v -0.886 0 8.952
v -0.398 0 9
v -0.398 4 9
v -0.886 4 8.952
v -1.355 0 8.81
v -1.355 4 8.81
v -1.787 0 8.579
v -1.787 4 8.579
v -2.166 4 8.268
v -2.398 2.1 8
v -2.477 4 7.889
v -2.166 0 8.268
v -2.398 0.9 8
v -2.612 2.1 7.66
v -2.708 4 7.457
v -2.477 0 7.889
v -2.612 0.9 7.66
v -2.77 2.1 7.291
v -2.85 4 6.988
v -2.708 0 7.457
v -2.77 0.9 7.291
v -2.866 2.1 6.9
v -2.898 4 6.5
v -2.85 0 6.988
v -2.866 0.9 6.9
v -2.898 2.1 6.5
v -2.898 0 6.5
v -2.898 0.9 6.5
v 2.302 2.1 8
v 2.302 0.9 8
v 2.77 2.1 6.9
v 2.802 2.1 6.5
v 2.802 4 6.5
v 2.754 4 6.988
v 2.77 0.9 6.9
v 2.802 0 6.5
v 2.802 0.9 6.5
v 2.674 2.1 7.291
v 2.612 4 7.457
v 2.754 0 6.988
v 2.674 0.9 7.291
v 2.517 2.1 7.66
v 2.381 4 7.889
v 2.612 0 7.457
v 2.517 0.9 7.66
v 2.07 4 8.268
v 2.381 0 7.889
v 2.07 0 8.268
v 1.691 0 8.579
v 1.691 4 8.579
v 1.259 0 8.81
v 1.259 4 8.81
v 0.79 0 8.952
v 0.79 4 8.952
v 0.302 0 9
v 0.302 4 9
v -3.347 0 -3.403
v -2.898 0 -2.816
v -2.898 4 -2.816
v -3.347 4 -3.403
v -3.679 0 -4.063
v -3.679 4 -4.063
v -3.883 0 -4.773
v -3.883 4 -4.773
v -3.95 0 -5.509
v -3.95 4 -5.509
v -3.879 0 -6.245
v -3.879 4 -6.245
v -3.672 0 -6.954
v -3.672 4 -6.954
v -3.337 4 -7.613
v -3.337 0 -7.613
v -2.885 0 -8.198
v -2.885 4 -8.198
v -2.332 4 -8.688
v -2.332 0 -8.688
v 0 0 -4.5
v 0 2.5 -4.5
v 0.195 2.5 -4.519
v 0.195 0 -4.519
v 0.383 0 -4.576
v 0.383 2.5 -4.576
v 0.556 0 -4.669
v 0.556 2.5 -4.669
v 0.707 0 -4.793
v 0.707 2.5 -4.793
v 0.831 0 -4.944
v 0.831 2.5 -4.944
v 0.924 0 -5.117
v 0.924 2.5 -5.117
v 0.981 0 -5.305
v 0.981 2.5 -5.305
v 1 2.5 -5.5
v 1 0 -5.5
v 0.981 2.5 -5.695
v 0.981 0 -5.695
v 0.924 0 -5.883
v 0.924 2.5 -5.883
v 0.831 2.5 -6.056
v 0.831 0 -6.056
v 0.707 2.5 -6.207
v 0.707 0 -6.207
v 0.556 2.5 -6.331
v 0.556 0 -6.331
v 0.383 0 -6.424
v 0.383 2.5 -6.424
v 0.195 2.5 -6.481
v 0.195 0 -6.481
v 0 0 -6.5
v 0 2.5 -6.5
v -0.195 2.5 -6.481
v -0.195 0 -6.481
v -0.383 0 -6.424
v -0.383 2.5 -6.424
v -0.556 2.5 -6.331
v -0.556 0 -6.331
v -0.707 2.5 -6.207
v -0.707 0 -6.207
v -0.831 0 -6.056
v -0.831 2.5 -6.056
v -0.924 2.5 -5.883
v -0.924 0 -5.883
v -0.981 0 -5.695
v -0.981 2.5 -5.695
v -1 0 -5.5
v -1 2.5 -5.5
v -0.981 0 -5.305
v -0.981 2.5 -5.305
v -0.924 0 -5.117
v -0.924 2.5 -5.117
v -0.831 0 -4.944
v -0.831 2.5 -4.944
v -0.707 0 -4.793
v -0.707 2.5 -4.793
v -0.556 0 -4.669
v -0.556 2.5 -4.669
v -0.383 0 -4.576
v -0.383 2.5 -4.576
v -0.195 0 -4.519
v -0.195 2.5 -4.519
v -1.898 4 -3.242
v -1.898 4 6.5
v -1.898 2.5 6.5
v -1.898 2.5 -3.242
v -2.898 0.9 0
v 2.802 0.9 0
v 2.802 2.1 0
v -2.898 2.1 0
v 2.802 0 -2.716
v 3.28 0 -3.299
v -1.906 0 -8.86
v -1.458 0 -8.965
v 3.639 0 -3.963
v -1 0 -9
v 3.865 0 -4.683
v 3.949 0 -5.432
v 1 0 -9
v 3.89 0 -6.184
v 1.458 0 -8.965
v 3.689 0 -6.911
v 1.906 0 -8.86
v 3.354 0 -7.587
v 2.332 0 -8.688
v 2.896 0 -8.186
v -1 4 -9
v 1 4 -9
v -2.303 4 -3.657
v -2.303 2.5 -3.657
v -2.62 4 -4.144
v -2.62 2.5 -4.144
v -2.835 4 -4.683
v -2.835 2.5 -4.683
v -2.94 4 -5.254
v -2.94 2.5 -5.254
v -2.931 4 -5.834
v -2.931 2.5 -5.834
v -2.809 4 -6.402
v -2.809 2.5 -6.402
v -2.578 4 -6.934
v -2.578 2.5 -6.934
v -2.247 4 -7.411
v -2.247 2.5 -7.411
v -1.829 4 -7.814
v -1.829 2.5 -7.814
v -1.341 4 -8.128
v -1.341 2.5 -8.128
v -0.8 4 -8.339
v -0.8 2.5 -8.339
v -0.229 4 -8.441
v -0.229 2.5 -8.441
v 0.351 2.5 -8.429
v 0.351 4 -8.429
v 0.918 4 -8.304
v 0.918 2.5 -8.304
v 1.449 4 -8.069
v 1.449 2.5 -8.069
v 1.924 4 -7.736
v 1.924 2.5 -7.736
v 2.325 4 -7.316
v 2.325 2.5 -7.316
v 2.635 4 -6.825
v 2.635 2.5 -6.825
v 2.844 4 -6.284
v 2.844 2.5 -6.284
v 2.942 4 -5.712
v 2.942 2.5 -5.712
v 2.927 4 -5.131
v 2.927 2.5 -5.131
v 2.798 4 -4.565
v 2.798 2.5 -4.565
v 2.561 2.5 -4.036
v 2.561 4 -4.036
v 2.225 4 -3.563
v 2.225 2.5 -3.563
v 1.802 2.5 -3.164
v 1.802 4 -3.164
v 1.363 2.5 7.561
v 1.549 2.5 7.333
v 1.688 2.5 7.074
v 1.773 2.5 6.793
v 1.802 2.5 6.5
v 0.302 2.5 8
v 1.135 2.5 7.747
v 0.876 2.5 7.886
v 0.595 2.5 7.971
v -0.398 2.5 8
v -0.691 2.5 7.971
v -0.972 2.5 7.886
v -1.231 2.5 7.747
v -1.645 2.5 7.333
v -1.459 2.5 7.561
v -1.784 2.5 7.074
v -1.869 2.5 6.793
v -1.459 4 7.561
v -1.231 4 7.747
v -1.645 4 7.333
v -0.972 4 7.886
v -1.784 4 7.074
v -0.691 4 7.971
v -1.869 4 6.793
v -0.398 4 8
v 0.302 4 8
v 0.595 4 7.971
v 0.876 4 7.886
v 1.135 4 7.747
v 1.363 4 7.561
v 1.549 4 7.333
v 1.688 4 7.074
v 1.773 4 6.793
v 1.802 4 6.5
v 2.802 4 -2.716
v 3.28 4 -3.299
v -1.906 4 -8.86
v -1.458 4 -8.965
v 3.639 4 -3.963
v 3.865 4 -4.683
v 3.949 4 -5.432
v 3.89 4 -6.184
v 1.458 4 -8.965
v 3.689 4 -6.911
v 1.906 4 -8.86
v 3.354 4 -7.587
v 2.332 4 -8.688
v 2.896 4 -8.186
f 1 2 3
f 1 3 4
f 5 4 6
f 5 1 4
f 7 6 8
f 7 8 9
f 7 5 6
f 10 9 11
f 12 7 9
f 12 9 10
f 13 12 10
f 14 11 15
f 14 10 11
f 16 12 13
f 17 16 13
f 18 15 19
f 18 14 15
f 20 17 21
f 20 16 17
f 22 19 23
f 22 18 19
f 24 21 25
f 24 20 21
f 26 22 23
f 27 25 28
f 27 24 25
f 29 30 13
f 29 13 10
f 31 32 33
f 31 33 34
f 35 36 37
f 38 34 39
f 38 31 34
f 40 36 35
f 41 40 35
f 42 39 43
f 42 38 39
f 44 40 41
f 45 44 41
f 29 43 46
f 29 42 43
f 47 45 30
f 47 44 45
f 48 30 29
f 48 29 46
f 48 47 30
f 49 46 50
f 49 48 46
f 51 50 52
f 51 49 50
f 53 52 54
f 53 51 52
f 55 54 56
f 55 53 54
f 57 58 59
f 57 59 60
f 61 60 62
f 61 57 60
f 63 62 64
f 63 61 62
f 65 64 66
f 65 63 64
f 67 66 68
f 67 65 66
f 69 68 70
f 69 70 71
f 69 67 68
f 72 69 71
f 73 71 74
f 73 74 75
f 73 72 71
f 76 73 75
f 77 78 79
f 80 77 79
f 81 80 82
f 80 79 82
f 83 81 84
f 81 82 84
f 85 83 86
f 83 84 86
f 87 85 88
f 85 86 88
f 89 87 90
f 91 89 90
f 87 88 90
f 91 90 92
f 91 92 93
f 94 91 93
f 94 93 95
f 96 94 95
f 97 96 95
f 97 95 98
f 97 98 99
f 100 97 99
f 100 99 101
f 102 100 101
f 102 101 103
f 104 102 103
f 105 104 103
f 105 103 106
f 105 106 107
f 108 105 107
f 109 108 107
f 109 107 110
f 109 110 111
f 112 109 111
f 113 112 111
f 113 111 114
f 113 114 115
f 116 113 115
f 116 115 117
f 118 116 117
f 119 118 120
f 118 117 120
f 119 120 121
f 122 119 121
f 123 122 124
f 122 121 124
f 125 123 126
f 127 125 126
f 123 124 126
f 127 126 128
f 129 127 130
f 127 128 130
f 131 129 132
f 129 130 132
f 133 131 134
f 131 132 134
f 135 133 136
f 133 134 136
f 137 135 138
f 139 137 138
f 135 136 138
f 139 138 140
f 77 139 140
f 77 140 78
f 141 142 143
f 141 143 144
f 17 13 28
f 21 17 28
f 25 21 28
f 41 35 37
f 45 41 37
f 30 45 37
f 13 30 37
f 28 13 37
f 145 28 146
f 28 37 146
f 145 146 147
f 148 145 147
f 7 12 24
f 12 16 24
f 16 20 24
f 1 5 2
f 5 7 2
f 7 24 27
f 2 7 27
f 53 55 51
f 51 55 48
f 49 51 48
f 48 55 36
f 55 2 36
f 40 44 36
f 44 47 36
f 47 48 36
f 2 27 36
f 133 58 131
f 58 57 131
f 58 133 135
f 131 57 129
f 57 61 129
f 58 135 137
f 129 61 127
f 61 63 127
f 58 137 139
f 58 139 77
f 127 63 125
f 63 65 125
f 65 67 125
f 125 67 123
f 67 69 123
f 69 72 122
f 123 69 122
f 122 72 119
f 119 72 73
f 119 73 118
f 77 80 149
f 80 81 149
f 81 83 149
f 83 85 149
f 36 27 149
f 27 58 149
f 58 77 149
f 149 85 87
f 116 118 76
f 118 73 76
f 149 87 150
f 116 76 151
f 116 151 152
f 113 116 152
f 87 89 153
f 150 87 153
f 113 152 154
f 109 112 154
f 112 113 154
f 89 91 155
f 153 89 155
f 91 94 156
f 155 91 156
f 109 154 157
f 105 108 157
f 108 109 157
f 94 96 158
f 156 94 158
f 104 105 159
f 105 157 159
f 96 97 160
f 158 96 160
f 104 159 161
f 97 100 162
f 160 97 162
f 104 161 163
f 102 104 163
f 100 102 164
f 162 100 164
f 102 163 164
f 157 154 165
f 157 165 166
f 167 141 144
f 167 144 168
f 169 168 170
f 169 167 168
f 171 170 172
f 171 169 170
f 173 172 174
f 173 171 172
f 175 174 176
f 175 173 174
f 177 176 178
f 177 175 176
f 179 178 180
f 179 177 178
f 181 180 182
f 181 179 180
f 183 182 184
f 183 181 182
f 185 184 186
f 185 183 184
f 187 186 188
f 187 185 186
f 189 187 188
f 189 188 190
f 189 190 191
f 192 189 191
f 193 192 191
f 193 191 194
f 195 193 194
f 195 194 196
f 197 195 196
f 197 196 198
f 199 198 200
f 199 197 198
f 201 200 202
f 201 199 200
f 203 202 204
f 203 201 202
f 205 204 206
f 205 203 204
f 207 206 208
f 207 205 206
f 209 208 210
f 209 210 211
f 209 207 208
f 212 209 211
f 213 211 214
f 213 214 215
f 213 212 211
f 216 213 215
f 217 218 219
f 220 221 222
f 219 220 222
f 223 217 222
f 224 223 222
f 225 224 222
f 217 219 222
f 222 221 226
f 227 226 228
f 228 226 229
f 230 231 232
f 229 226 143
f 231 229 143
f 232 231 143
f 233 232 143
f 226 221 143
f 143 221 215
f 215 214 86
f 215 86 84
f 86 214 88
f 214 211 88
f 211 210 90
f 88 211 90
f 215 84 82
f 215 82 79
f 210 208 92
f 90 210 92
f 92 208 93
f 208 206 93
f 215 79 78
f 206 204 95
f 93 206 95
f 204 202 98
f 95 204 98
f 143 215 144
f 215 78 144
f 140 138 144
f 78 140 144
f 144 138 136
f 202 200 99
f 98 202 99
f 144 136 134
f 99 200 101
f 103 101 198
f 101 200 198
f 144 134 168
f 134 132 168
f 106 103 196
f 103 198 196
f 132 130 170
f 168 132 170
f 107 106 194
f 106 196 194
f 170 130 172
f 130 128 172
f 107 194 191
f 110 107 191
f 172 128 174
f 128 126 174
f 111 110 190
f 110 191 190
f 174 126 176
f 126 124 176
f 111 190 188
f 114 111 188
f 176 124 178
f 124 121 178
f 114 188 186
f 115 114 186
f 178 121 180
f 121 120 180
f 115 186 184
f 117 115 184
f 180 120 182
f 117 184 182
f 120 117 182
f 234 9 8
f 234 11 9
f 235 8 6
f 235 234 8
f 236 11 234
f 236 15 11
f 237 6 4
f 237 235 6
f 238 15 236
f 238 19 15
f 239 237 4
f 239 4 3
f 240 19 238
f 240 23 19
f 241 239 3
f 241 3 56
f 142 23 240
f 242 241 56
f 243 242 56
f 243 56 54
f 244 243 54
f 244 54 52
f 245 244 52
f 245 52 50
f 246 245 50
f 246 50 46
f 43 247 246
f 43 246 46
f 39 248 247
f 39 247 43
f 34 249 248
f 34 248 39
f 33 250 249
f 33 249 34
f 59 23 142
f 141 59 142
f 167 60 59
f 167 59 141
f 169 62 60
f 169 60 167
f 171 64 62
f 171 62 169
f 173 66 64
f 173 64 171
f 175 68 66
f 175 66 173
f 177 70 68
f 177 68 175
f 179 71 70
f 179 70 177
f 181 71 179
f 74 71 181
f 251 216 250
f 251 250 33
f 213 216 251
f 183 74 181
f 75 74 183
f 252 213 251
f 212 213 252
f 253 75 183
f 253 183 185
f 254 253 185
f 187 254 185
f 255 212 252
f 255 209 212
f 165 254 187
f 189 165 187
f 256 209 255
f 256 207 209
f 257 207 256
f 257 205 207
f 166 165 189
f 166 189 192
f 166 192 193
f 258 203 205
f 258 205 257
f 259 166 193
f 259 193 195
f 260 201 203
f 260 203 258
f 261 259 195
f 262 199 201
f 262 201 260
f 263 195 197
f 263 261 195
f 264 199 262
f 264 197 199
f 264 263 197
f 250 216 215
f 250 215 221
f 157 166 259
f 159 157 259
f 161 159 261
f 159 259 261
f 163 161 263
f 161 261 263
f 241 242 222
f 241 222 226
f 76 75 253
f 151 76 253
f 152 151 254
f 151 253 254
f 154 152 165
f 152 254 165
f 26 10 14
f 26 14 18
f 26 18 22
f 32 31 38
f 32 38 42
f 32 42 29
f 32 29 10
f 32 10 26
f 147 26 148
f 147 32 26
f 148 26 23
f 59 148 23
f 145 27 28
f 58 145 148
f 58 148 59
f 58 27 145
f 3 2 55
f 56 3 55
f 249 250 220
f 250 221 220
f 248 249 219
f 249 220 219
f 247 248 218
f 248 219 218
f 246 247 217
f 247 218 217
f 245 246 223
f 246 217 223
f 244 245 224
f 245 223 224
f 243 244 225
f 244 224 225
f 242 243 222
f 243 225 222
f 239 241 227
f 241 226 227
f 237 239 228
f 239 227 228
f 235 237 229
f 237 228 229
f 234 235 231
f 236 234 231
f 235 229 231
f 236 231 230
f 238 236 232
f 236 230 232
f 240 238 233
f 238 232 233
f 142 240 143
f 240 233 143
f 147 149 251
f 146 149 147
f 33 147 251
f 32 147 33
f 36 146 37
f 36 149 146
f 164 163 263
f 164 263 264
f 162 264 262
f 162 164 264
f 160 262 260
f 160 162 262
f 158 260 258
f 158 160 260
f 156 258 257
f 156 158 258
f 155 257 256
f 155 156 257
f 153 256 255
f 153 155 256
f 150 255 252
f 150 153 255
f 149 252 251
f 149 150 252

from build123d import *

# Parameters (mm, degrees)
SKETCH_1_W          = 8
SKETCH_1_H          = 18
EXTRUDE_1_DEPTH     = 4
CUT_EXTRUDE_4_DEPTH = 1.5
SKETCH_6_W          = 8
SKETCH_6_H          = 1.2
CUT_EXTRUDE_5_DEPTH = 13.68857754
SKETCH_7_R          = 1
CUT_EXTRUDE_6_DEPTH = 11.161200716
FILLET_1_R          = 3
FILLET_2_R          = 2
FILLET_3_R          = 1.5
CUT_EXTRUDE_START   = -4
CUT_EXTRUDE_7_DEPTH = 4


# Read off the part's stored shape, not the designer's step: 切除-拉伸7
with BuildPart() as part:
    # 草图1 → 凸台-拉伸1 (new body)
    with BuildSketch(Plane(origin=(0, 0, 0), x_dir=(1, 0, 0), z_dir=(0, 1, 0))):
        Rectangle(SKETCH_1_W, SKETCH_1_H)
    extrude(amount=EXTRUDE_1_DEPTH)

    # 草图5 → 切除-拉伸4 (cut)
    with BuildSketch(Plane(origin=(0, 4, 0), x_dir=(1, 0, 0), z_dir=(0, 1, 0))):
        with BuildLine():
            Line((1.802116427, -8), (-1.897883573, -8))
            Line((-1.897883573, -8), (-1.897883573, 3.241562942))
            ThreePointArc((-1.897883573, 3.241562942), (0.061482678, 8.449359232), (1.802116427, 3.164432321))
            Line((1.802116427, 3.164432321), (1.802116427, -8))
        make_face()
    extrude(amount=-CUT_EXTRUDE_4_DEPTH, mode=Mode.SUBTRACT)

    # 草图6 → 切除-拉伸5 (cut, through all)
    with BuildSketch(Plane(origin=(4, 0, 0), x_dir=(0, 0, -1), z_dir=(1, 0, 0))):
        with Locations((-4, 1.5)):
            Rectangle(SKETCH_6_W, SKETCH_6_H)
    extrude(amount=-CUT_EXTRUDE_5_DEPTH, mode=Mode.SUBTRACT)

    # 草图7 → 切除-拉伸6 (cut, through all)
    with BuildSketch(Plane(origin=(0, 2.5, 0), x_dir=(1, 0, 0), z_dir=(0, 1, 0))):
        with Locations(Location((0, 5.5, 0), (0, 0, 270))):
            Circle(SKETCH_7_R)
    extrude(amount=-CUT_EXTRUDE_6_DEPTH, mode=Mode.SUBTRACT)

    # 圆角1
    fillet_1_edges = [part.edges().sort_by_distance(p)[0] for p in [
        (-4, 2, -9),
        (4, 2, -9),
    ]]
    fillet(fillet_1_edges, radius=FILLET_1_R)

    # 圆角2
    # the kernel refuses this fillet: 2 mm, written as the material it takes off along each edge
    with BuildSketch(Plane(origin=(4, -5, 9), x_dir=(0, 0, -1), z_dir=(0, 1, 0)), Plane(origin=(-4, -5, 9), x_dir=(1, 0, 0), z_dir=(0, 1, 0))) as fillet_2_piece_1:
        with BuildLine():
            CenterArc((FILLET_2_R, FILLET_2_R), FILLET_2_R, 180, 90)
            Line((0, FILLET_2_R), (0, 0))
            Line((0, 0), (FILLET_2_R, 0))
        make_face()
    extrude(amount=14, mode=Mode.SUBTRACT)

    # 圆角3
    fillet_3_edges = [part.edges().sort_by_distance(p)[0] for p in [
        (1.802116427, 3.25, 8),
        (-1.897883573, 3.25, 8),
    ]]
    fillet(fillet_3_edges, radius=FILLET_3_R)

    # 切除-拉伸7 outline → 切除-拉伸7 (cut)
    with BuildSketch(Plane(origin=(0, 4, 0), x_dir=(1, 0, 0), z_dir=(0, 1, 0)).offset(CUT_EXTRUDE_START)):
        with BuildLine():
            ThreePointArc((-2.897883573, 2.815829589), (-3.931803195, 5.878713127), (-2.332278942, 8.687942116))
            ThreePointArc((-2.332278942, 8.687942116), (-3.549199564, 7.581638893), (-4, 6))
            Line((-4, 6), (-4, -7))
            ThreePointArc((-4, -7), (-3.414213562, -8.414213562), (-2, -9))
            Line((-2, -9), (-0.397883573, -9))
            ThreePointArc((-0.397883573, -9), (-2.165650526, -8.267766953), (-2.897883573, -6.5))
            Line((-2.897883573, -6.5), (-2.897883573, 2.815829589))
        make_face()
        with BuildLine():
            Line((4, -7), (4, 6))
            ThreePointArc((4, 6), (3.549199564, 7.581638893), (2.332278942, 8.687942117))
            ThreePointArc((2.332278942, 8.687942117), (3.937831945, 5.809805707), (2.802116427, 2.71600224))
            Line((2.802116427, 2.71600224), (2.802116427, -6.5))
            ThreePointArc((2.802116427, -6.5), (2.06988338, -8.267766953), (0.302116427, -9))
            Line((0.302116427, -9), (2, -9))
            ThreePointArc((2, -9), (3.414213562, -8.414213562), (4, -7))
        make_face()
    extrude(amount=CUT_EXTRUDE_7_DEPTH, mode=Mode.SUBTRACT)


solid = part.part
